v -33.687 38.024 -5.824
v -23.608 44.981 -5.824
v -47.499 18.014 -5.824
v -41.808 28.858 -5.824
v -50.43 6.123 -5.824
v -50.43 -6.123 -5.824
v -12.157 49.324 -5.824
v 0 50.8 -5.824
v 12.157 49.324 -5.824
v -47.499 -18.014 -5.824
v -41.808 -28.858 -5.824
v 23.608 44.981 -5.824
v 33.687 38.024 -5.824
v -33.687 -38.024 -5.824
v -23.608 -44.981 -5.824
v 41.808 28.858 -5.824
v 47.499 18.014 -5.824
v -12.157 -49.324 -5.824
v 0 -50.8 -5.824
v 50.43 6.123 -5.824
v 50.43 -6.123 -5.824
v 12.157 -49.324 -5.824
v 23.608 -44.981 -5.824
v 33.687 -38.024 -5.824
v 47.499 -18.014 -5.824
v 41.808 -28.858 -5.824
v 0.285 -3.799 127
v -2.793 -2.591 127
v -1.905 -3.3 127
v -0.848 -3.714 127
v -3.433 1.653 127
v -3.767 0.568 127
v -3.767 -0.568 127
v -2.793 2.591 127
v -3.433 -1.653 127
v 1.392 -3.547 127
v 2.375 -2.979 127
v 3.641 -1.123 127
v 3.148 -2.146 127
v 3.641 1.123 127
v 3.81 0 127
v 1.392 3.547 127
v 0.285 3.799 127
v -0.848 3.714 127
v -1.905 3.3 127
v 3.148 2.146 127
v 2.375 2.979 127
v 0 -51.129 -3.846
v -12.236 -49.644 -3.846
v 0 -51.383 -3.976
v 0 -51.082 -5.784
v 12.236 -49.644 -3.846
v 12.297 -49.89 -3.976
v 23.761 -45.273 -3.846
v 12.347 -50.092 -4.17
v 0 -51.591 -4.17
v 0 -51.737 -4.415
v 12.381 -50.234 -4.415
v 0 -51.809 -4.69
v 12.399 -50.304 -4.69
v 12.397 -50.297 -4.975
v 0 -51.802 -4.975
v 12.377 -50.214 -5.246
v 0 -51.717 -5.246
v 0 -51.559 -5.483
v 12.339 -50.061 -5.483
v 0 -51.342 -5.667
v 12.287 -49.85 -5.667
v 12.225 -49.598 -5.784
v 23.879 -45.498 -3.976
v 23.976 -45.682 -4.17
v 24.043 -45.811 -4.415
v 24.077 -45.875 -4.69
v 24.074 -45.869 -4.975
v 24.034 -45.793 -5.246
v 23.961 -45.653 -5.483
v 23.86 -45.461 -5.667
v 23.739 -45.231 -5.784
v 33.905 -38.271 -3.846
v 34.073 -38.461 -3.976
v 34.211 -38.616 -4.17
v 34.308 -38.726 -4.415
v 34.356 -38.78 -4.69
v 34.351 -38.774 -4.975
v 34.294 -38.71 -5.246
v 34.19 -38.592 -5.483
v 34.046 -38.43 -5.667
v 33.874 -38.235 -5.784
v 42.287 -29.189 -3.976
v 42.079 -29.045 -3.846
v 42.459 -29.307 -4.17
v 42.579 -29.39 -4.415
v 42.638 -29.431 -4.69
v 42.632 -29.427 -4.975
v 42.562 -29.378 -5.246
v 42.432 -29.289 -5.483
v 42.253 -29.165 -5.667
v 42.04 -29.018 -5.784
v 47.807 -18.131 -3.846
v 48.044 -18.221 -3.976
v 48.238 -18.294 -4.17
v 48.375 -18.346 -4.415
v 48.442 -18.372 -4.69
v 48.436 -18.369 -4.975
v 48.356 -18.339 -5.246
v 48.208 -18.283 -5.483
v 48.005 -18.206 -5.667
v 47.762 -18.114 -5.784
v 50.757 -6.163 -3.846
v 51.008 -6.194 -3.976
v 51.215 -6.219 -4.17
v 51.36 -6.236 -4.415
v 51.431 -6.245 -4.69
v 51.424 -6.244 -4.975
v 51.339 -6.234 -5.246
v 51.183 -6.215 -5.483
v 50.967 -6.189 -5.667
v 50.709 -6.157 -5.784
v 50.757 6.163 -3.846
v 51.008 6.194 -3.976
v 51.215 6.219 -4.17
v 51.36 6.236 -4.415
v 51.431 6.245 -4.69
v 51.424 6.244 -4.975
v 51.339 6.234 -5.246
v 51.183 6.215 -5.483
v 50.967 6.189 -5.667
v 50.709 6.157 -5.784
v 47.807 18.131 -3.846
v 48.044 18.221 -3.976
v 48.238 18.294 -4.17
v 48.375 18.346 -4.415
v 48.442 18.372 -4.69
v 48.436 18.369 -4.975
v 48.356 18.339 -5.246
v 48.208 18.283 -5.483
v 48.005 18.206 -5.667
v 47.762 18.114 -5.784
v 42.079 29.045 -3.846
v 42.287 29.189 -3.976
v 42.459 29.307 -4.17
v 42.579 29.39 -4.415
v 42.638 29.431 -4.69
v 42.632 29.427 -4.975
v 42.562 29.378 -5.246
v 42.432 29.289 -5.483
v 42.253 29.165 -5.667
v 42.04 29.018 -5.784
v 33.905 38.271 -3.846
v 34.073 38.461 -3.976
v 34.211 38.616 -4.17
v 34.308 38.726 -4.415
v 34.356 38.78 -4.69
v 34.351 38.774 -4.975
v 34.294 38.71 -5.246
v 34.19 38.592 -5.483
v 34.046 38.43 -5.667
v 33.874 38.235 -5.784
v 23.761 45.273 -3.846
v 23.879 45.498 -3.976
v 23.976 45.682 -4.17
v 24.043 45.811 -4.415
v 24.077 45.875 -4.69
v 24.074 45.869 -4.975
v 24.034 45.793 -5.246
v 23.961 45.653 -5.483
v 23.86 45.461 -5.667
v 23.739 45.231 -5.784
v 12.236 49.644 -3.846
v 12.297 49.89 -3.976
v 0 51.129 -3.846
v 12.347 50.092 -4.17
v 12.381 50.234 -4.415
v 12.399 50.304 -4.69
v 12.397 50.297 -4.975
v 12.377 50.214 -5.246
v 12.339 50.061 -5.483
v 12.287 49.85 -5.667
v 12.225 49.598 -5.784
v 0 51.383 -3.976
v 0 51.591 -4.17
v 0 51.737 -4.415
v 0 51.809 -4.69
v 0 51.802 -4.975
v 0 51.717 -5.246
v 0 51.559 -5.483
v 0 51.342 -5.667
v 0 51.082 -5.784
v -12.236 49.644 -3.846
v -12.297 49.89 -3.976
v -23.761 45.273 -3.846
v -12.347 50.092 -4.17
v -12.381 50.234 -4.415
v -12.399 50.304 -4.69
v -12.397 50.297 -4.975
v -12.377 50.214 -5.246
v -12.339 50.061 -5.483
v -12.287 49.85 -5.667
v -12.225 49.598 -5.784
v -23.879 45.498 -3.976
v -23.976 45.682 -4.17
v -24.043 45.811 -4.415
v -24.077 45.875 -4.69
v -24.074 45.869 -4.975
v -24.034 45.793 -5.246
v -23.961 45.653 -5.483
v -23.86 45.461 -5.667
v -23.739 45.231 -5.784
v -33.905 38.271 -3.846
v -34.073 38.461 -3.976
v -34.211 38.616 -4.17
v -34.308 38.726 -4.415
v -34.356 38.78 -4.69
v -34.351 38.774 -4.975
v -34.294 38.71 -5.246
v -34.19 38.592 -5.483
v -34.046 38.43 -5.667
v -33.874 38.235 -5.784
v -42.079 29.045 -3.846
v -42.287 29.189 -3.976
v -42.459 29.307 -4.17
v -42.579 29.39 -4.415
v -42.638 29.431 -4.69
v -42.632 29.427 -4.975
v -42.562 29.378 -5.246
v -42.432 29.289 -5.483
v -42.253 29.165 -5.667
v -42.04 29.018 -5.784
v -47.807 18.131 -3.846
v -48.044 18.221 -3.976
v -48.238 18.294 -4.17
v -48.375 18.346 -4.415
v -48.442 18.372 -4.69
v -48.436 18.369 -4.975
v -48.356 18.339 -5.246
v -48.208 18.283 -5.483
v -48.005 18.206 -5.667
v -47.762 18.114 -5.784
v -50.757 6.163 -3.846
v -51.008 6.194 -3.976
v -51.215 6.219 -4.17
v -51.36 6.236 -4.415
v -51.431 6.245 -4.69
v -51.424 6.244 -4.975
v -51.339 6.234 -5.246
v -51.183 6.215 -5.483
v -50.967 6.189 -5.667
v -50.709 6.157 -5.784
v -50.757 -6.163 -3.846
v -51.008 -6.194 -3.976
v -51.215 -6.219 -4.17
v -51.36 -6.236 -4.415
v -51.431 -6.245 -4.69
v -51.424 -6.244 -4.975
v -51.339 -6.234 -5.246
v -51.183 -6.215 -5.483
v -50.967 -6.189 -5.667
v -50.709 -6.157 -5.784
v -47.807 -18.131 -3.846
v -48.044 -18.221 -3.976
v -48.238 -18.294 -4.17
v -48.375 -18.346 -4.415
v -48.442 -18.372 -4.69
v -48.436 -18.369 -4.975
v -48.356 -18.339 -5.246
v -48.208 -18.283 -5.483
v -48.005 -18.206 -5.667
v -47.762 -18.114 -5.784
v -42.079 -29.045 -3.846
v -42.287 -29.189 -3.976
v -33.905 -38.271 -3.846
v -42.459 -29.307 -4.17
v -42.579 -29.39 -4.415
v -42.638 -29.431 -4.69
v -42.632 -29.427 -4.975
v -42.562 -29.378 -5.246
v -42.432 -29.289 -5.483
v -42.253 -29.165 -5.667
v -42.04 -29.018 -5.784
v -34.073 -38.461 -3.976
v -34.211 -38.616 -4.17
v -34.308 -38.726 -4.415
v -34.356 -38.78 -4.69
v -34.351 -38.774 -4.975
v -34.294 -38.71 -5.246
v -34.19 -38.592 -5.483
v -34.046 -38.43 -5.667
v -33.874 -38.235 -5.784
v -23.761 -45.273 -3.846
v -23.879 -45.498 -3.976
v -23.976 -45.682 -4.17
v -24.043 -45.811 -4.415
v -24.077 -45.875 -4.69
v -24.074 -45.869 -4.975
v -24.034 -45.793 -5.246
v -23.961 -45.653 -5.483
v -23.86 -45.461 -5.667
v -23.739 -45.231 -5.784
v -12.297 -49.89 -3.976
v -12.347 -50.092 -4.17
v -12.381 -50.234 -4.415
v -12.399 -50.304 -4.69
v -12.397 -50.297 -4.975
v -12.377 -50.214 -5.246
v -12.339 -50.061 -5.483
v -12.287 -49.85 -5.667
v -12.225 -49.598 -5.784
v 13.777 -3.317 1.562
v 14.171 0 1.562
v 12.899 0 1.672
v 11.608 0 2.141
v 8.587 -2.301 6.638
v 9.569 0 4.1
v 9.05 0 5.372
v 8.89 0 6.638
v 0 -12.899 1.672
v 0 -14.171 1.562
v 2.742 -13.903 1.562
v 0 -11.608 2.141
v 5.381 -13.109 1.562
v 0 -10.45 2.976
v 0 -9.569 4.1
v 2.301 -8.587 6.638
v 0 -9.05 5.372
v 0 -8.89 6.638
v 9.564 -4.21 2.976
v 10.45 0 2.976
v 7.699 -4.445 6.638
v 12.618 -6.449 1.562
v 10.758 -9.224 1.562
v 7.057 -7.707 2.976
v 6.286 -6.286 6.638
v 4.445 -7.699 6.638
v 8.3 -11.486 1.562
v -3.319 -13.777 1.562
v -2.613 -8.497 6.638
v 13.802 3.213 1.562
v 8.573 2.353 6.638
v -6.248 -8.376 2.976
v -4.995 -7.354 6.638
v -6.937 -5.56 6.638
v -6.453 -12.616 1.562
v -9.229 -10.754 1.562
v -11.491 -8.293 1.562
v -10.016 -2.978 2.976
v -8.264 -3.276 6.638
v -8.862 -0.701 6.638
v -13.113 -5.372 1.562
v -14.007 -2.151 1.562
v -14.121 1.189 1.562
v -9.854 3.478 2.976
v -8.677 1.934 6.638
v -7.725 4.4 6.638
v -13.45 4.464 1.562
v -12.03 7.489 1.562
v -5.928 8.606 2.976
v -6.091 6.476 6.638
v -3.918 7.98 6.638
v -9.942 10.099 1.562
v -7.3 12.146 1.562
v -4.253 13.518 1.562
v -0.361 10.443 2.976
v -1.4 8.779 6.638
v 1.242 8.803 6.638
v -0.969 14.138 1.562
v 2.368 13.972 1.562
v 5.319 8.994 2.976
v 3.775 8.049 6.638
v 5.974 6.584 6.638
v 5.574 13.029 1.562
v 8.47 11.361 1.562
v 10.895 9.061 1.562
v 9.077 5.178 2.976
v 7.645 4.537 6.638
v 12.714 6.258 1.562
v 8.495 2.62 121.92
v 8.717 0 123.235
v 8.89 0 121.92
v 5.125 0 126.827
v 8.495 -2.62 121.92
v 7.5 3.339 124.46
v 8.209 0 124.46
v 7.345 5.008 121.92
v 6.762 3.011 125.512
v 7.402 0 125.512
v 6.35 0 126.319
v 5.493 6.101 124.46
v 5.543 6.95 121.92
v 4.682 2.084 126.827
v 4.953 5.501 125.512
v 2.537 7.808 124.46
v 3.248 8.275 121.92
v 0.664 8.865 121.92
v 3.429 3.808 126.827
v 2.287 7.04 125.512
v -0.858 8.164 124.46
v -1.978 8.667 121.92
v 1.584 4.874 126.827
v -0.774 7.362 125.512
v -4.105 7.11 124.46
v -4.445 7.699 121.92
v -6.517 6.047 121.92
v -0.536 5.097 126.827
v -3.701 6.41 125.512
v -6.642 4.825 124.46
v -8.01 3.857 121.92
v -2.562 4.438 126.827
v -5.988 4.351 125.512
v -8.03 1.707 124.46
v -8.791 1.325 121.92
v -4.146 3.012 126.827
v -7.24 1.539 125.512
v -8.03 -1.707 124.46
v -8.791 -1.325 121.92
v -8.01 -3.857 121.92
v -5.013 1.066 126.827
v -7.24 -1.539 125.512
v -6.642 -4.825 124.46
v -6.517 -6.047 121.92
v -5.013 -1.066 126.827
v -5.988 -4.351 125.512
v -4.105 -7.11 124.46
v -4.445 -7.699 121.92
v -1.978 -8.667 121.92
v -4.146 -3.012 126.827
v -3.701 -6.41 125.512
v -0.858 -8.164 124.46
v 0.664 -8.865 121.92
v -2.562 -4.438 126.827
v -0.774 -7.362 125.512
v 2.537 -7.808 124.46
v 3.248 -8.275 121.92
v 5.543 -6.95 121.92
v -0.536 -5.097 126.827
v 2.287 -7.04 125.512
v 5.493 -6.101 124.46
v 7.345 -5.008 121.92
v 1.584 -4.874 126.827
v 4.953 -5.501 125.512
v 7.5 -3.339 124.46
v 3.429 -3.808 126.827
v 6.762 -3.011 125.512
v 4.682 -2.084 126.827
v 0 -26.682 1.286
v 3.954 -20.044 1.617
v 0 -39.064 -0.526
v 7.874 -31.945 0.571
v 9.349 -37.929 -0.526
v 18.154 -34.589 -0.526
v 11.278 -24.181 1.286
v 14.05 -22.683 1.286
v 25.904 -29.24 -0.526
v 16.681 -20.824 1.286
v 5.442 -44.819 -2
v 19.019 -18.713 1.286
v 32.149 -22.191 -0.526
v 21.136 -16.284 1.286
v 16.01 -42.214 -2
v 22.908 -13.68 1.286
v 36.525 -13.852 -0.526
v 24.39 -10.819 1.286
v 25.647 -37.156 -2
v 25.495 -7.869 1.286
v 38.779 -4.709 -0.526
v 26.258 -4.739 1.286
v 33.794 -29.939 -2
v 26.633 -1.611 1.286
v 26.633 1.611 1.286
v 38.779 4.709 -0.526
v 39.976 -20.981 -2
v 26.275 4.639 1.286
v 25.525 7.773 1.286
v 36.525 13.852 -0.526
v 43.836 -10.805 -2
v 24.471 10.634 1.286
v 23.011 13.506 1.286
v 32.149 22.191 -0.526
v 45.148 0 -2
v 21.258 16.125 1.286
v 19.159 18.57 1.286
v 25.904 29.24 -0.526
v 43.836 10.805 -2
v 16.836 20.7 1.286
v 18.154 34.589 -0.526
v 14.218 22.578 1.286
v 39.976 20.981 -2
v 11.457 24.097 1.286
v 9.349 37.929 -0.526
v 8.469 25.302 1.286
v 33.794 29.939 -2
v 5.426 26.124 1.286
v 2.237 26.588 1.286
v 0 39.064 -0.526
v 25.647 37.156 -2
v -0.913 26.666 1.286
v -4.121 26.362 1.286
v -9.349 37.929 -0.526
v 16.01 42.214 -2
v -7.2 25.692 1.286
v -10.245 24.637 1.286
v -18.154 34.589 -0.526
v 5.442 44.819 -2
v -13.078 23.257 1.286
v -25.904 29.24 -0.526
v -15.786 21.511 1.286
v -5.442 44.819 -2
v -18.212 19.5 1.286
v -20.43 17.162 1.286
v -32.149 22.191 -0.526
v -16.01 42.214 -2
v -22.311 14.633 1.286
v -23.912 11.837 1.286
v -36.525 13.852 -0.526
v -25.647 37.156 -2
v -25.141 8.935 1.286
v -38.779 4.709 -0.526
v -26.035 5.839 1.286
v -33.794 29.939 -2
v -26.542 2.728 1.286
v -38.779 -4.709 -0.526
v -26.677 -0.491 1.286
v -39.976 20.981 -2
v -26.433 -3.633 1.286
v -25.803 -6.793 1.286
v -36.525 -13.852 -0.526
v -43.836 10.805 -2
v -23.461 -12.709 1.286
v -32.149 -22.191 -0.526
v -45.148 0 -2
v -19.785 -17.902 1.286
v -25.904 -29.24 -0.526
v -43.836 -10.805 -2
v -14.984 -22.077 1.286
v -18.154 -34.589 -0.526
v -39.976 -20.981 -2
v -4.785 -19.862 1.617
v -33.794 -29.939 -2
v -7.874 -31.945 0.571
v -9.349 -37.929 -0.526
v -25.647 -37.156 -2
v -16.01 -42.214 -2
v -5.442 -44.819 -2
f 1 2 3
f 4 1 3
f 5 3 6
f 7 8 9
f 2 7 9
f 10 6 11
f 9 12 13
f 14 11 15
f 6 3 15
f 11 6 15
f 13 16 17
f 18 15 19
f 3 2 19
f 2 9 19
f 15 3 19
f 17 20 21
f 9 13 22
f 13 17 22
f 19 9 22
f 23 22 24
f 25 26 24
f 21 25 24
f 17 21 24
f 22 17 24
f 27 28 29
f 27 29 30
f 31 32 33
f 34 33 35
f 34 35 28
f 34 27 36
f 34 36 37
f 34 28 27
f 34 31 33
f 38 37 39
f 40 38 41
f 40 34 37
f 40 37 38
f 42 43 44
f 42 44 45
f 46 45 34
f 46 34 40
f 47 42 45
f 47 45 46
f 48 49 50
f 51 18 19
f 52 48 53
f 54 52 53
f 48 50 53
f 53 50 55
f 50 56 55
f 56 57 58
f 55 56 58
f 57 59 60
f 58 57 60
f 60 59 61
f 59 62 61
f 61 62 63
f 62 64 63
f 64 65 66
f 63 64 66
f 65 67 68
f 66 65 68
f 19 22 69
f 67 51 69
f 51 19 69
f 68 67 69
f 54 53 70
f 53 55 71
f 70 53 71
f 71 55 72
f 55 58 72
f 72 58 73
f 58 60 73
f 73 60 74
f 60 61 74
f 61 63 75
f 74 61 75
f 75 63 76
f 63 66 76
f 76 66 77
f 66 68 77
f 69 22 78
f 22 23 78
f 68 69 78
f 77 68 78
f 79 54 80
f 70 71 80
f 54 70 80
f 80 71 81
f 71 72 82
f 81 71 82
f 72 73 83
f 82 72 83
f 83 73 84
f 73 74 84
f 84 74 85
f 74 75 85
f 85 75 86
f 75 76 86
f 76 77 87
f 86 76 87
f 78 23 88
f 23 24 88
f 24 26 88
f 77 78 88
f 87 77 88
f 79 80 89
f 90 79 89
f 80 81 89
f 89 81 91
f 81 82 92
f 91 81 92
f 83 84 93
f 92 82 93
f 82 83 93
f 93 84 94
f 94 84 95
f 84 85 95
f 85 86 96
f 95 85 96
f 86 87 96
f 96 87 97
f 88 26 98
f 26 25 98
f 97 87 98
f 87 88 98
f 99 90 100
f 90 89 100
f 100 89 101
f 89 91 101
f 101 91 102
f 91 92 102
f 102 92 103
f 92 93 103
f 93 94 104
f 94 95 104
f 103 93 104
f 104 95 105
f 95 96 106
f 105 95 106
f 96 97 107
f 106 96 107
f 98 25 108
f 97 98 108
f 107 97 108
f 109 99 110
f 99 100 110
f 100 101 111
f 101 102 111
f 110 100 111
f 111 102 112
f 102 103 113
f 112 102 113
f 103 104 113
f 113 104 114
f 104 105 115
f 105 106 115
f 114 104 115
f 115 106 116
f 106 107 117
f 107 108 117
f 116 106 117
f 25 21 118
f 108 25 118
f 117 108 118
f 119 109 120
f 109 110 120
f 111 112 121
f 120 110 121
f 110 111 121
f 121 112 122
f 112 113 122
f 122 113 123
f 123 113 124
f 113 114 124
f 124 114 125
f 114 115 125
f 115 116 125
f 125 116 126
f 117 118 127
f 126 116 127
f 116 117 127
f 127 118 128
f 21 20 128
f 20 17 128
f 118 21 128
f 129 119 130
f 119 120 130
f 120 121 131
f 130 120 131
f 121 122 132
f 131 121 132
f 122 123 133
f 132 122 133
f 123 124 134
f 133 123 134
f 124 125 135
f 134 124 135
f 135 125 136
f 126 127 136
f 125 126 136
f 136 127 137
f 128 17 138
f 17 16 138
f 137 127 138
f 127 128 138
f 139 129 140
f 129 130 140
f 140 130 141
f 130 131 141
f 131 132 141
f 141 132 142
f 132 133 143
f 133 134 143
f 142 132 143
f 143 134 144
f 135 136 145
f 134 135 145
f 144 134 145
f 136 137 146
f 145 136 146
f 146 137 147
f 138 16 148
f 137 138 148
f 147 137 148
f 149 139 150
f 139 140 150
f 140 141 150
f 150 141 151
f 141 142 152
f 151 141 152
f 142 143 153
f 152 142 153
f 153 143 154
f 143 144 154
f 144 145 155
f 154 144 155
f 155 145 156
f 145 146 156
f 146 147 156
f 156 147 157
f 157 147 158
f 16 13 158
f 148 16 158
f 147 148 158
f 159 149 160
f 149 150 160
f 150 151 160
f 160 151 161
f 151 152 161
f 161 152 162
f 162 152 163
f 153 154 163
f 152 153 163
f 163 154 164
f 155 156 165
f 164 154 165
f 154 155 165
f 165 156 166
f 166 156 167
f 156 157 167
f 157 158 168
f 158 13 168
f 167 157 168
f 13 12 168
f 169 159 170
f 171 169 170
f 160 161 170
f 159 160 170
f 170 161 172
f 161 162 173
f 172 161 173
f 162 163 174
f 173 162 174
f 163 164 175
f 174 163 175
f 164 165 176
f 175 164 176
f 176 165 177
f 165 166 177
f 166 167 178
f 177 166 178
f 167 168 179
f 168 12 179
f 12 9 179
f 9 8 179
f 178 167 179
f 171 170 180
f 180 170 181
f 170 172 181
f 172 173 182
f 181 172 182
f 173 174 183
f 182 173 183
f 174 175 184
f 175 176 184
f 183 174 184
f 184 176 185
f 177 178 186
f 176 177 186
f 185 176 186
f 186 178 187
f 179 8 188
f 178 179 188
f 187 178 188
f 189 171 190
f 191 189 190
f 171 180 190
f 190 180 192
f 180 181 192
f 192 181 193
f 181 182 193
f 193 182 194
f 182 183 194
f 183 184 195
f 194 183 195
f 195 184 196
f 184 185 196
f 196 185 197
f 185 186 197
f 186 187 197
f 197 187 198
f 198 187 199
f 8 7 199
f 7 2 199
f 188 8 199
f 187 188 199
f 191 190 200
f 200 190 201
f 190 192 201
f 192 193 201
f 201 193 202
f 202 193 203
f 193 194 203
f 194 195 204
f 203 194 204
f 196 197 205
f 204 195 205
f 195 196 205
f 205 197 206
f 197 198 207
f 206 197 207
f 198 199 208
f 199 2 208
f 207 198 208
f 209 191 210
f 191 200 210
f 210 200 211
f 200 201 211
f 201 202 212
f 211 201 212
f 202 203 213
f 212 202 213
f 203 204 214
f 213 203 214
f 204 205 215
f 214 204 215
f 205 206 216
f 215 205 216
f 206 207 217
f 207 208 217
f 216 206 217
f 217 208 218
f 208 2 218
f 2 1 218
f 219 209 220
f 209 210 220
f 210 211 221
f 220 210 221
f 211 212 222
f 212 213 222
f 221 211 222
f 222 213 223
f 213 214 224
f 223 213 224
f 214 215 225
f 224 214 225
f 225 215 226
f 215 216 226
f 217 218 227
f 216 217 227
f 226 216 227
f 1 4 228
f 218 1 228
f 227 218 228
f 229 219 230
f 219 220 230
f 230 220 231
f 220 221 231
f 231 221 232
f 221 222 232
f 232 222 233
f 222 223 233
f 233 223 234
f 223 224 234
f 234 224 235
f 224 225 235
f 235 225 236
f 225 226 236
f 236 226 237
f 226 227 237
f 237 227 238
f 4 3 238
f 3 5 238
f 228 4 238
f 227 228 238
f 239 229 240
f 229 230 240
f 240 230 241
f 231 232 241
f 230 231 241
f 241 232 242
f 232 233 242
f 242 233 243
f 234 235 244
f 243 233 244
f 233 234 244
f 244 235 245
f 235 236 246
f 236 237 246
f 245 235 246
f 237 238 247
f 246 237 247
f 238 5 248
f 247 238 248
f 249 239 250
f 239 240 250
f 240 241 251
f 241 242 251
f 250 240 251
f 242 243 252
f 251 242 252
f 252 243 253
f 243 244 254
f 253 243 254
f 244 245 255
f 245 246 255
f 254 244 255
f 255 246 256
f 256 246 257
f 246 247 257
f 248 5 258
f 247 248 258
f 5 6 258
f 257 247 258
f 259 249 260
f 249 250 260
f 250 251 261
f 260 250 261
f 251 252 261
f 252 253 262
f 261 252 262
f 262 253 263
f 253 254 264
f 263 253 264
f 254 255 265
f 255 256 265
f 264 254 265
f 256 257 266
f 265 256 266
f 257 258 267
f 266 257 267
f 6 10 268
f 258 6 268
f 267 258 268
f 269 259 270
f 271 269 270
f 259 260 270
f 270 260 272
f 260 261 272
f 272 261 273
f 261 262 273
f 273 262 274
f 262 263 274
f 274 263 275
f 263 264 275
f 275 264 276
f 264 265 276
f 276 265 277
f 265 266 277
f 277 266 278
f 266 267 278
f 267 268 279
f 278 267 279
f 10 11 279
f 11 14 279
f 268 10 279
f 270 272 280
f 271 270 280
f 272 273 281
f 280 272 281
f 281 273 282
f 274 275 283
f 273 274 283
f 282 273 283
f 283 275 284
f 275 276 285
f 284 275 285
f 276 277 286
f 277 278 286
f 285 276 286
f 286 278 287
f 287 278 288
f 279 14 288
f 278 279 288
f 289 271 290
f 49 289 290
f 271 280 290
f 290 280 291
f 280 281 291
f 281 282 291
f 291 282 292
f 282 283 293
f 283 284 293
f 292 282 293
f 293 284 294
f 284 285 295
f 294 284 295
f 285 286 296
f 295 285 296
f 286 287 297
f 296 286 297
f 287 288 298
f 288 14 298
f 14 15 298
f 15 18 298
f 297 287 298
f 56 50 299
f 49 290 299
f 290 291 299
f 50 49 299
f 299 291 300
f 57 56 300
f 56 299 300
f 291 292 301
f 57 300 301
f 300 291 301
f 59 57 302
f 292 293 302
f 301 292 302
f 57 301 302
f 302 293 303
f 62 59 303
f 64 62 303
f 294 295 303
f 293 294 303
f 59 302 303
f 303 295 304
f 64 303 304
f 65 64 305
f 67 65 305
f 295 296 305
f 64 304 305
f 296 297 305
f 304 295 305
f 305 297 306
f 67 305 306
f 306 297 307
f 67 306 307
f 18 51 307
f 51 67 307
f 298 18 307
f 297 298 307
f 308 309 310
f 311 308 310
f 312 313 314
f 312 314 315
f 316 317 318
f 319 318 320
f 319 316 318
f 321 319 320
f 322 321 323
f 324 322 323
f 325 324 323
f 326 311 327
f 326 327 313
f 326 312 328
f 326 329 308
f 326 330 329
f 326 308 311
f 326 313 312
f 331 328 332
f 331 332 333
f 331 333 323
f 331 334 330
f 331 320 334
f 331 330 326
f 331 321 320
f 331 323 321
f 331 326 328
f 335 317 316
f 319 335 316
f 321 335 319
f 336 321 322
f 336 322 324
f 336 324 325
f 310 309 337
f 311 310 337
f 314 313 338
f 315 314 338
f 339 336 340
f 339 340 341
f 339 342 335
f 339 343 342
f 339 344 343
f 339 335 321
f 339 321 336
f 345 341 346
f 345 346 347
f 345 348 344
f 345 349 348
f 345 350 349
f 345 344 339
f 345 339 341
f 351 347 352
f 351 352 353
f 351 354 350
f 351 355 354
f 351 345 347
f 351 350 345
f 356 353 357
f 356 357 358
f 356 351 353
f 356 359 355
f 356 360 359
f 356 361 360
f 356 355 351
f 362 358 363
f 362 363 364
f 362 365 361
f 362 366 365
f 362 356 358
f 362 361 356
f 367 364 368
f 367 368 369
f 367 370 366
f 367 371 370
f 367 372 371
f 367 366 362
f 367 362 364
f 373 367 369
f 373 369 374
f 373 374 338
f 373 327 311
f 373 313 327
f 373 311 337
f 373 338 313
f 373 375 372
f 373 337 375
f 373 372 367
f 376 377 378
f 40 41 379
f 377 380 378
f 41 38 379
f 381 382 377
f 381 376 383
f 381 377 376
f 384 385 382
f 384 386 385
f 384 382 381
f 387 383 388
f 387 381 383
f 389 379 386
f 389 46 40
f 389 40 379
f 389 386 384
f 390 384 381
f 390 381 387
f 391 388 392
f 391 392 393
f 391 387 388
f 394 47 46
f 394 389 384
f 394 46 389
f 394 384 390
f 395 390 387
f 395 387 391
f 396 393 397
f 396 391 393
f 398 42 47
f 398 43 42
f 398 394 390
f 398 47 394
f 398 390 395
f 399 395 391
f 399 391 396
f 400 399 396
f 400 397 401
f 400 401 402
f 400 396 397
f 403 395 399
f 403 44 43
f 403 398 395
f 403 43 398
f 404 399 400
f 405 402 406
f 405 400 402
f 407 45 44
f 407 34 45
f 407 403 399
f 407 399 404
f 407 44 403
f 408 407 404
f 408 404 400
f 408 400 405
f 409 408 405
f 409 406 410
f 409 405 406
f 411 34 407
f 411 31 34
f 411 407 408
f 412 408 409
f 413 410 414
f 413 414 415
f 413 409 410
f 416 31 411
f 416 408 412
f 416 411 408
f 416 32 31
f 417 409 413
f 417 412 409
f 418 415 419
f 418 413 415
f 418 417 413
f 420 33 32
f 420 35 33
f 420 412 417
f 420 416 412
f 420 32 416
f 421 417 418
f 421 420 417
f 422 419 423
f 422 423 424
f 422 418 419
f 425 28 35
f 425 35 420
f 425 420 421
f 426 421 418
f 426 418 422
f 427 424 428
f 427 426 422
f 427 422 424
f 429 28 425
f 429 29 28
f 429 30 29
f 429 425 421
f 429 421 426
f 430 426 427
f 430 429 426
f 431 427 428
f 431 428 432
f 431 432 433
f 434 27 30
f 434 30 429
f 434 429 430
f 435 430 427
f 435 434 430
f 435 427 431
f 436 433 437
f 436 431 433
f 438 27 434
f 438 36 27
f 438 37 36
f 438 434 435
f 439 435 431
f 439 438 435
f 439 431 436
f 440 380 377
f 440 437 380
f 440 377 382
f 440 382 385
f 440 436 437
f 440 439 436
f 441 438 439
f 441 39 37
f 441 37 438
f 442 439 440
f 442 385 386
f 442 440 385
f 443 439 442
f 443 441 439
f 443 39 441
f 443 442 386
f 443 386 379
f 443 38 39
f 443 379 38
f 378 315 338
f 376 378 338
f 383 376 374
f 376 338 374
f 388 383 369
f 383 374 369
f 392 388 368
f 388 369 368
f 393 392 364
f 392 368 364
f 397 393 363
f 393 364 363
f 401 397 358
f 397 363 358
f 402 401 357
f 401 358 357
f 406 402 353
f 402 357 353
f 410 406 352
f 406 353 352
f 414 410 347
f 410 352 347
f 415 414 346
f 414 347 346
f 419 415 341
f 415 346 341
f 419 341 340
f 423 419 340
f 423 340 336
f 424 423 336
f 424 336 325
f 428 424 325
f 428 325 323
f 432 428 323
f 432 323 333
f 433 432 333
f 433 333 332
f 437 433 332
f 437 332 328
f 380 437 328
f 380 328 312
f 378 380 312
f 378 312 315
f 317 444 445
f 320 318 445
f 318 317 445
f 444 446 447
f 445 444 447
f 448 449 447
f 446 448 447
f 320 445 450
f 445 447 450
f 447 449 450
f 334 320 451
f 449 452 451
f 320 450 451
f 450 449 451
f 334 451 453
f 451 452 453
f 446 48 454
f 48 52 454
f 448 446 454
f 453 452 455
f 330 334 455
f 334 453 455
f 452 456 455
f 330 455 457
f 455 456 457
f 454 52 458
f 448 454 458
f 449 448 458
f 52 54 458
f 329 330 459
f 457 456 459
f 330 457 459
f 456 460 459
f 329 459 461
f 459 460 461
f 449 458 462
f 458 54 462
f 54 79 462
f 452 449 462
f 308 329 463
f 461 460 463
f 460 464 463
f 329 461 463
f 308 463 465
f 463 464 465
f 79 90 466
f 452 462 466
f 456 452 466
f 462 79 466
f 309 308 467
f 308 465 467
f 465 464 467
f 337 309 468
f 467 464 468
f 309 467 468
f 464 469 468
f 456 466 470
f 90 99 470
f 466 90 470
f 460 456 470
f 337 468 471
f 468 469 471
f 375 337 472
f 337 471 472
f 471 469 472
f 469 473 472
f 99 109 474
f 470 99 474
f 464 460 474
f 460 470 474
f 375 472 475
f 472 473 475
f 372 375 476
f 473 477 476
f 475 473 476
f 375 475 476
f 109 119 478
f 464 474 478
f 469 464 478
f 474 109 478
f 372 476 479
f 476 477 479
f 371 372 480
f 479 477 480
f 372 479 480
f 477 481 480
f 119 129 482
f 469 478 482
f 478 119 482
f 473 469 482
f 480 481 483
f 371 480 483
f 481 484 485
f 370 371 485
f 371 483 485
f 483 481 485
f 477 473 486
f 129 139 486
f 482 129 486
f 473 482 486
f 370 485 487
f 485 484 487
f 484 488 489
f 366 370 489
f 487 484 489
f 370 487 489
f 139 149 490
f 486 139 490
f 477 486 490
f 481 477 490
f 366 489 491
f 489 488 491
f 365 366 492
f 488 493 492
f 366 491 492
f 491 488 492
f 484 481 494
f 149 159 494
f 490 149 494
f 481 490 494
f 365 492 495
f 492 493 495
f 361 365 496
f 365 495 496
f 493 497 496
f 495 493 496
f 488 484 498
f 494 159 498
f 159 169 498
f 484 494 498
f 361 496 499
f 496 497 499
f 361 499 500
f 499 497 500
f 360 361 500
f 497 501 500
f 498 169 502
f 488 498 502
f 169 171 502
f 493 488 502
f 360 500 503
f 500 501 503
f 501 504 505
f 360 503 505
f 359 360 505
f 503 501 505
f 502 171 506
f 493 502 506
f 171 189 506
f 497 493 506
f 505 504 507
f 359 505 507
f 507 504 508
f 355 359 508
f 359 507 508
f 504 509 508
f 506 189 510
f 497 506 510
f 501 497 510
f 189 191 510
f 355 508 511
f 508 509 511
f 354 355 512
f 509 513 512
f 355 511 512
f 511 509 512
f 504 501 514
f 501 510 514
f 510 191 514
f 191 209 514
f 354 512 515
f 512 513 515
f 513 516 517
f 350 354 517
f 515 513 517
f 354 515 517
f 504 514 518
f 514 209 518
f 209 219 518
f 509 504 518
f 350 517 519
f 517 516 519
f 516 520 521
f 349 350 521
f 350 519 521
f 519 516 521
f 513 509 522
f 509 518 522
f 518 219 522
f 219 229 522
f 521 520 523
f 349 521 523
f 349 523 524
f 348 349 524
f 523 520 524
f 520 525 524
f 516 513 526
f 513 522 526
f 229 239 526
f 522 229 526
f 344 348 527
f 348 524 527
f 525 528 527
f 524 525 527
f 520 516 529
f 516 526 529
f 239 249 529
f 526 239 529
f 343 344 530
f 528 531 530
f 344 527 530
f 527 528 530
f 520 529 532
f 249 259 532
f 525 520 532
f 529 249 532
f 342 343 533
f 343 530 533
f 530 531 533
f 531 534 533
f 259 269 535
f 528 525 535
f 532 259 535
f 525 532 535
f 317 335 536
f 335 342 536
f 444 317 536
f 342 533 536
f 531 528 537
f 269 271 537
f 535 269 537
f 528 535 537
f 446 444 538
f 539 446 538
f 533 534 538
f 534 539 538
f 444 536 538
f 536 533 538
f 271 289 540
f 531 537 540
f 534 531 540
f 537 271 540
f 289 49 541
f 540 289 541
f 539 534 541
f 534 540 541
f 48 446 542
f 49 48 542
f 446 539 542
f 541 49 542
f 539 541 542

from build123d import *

# Parameters (mm, degrees)
F0_R     = 8.89
F1_DEPTH = 127
F4_R     = 5.08


with BuildPart() as f1:
    # F0 (on Top) → F1 (new body)
    with BuildSketch(Plane.XY):
        Circle(F0_R)
    extrude(amount=F1_DEPTH)

    # F2 (on Right) → F3 (revolve)
    with BuildSketch(Plane.YZ):
        with BuildLine():
            Line((-50.8, -5.823538), (0, -5.823538))
            Line((0, -5.823538), (0, 0))
            ThreePointArc((0, 0), (-25.811333, 1.355232), (-51.129398, -3.846418))
            ThreePointArc((-51.129398, -3.846418), (-51.802186, -4.974508), (-50.8, -5.823538))
        make_face()
    revolve(axis=Axis((0, 0, -1.317876), (0, 0, 1)))

    # F4
    f4_edges = [f1.edges().sort_by_distance(p)[0] for p in [
        (-8.89, 0, 127),
        (-6.286179, 6.286179, 1.215018),
        (6.286179, -6.286179, 1.215018),
    ]]
    fillet(f4_edges, radius=F4_R)


solid = f1.part
